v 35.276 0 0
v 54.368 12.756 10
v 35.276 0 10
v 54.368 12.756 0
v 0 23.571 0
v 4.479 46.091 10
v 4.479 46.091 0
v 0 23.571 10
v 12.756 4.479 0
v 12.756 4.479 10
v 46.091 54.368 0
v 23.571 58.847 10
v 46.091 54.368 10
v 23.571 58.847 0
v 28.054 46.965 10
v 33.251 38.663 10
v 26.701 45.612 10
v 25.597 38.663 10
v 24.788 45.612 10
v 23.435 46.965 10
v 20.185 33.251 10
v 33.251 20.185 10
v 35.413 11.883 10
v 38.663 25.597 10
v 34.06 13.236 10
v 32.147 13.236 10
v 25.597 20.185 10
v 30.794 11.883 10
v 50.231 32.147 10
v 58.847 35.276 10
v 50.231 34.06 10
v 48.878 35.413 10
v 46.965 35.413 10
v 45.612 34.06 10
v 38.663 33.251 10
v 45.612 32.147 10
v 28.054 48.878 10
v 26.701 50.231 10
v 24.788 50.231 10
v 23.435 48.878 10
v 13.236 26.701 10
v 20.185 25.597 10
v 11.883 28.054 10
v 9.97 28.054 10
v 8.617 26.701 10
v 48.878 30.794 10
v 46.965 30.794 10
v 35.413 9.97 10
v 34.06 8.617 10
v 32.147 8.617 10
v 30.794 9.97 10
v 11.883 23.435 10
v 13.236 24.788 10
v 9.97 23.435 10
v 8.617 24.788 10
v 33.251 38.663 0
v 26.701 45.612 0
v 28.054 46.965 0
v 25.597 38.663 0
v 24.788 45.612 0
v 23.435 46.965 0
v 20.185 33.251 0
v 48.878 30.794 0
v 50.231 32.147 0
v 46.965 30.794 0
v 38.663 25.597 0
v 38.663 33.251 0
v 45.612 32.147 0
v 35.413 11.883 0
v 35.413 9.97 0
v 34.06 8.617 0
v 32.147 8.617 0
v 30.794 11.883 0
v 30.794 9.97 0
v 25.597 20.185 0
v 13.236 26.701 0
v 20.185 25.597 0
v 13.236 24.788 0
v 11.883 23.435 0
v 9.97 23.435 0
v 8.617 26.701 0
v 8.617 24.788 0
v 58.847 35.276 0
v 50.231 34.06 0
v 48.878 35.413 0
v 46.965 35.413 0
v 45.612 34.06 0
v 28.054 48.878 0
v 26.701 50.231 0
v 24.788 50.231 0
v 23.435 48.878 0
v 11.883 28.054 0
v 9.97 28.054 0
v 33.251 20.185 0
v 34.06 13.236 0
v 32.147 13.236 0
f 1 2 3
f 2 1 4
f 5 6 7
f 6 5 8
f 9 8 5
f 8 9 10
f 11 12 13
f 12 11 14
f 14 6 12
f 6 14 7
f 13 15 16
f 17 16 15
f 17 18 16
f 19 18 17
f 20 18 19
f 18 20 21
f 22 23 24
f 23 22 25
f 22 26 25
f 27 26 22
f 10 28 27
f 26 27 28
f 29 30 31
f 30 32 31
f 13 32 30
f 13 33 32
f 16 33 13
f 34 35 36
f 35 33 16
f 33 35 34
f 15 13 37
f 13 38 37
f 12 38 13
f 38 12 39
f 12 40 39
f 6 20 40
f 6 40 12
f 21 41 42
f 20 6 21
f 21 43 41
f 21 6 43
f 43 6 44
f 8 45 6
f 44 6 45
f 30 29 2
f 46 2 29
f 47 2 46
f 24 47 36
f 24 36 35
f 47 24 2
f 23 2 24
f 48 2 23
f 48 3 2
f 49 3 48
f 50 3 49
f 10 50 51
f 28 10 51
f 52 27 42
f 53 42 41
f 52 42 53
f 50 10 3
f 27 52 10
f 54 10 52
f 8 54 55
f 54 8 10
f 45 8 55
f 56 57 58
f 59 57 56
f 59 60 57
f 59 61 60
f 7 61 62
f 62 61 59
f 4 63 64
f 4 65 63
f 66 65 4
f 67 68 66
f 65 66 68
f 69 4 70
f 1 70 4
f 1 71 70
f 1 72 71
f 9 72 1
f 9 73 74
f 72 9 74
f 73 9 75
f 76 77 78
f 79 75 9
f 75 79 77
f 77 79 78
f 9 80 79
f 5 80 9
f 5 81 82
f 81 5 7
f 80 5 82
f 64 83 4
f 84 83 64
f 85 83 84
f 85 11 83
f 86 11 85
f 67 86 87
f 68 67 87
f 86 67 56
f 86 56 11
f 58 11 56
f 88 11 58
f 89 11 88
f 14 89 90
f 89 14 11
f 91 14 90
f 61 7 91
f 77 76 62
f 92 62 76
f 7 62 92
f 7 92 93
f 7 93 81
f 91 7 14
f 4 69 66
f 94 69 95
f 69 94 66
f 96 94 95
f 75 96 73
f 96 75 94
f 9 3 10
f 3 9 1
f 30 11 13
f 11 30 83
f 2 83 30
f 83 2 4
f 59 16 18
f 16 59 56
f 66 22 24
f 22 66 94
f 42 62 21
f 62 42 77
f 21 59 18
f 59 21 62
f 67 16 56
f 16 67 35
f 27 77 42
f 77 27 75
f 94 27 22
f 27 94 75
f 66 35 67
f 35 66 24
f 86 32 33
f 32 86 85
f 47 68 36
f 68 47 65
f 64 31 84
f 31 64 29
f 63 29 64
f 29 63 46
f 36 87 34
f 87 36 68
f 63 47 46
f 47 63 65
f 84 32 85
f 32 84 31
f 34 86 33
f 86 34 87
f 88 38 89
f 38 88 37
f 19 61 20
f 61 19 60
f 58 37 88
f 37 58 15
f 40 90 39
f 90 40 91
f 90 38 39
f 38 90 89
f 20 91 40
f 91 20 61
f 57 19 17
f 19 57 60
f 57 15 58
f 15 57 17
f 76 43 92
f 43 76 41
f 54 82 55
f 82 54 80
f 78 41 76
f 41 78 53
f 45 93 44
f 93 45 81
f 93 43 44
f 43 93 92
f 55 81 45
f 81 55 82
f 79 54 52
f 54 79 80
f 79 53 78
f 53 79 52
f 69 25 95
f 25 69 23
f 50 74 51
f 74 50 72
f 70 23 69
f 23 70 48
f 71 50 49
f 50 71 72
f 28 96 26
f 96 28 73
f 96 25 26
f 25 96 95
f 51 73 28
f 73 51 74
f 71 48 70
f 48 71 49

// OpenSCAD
$fn = 32;

// ----------------------------------------------------------------------
// Polygon plate: 8-gon R30, 4 bolt windows
// ----------------------------------------------------------------------

// --- parameters (mm) ---
sides = 8;                // number of polygon sides
plate_r = 30;             // circumscribed radius of the polygon
bore_r = 10;              // centre bore radius
bolts = 4;                // number of bolt windows
ring_r = 18.86;           // bolt-circle radius
bolt_r = 2.5;             // bolt window radius
plate_t = 10;             // plate thickness, Z (extrusion height)

plate_d = 2 * plate_r;  // circumscribed diameter
bore_d = 2 * bore_r;  // centre bore diameter
bolt_d = 2 * bolt_r;  // bolt window diameter
ring_d = 2 * ring_r;  // bolt-circle diameter

profile = [[58.847, 35.276], [46.091, 54.368], [23.571, 58.847], [4.479, 46.091], [0, 23.571], [12.756, 4.479], [35.276, 0], [54.368, 12.756]];  // primary outline, 8 points, counter clockwise
void_1 = [[38.663, 33.251], [33.251, 38.663], [25.597, 38.663], [20.185, 33.251], [20.185, 25.597], [25.597, 20.185], [33.251, 20.185], [38.663, 25.597]];  // centre bore, 8 points
void_2 = [[50.231, 34.06], [48.878, 35.413], [46.965, 35.413], [45.612, 34.06], [45.612, 32.147], [46.965, 30.794], [48.878, 30.794], [50.231, 32.147]];  // bolt window 1, 8 points
void_3 = [[28.054, 48.878], [26.701, 50.231], [24.788, 50.231], [23.435, 48.878], [23.435, 46.965], [24.788, 45.612], [26.701, 45.612], [28.054, 46.965]];  // bolt window 2, 8 points
void_4 = [[13.236, 26.701], [11.883, 28.054], [9.97, 28.054], [8.617, 26.701], [8.617, 24.788], [9.97, 23.435], [11.883, 23.435], [13.236, 24.788]];  // bolt window 3, 8 points
void_5 = [[35.413, 11.883], [34.06, 13.236], [32.147, 13.236], [30.794, 11.883], [30.794, 9.97], [32.147, 8.617], [34.06, 8.617], [35.413, 9.97]];  // bolt window 4, 8 points

// --- the one profile operation ---
difference() {
  linear_extrude(height = plate_t) polygon(points = profile);
  translate([0, 0, -1])
    linear_extrude(height = plate_t + 2) polygon(points = void_1);
  translate([0, 0, -1])
    linear_extrude(height = plate_t + 2) polygon(points = void_2);
  translate([0, 0, -1])
    linear_extrude(height = plate_t + 2) polygon(points = void_3);
  translate([0, 0, -1])
    linear_extrude(height = plate_t + 2) polygon(points = void_4);
  translate([0, 0, -1])
    linear_extrude(height = plate_t + 2) polygon(points = void_5);
}
